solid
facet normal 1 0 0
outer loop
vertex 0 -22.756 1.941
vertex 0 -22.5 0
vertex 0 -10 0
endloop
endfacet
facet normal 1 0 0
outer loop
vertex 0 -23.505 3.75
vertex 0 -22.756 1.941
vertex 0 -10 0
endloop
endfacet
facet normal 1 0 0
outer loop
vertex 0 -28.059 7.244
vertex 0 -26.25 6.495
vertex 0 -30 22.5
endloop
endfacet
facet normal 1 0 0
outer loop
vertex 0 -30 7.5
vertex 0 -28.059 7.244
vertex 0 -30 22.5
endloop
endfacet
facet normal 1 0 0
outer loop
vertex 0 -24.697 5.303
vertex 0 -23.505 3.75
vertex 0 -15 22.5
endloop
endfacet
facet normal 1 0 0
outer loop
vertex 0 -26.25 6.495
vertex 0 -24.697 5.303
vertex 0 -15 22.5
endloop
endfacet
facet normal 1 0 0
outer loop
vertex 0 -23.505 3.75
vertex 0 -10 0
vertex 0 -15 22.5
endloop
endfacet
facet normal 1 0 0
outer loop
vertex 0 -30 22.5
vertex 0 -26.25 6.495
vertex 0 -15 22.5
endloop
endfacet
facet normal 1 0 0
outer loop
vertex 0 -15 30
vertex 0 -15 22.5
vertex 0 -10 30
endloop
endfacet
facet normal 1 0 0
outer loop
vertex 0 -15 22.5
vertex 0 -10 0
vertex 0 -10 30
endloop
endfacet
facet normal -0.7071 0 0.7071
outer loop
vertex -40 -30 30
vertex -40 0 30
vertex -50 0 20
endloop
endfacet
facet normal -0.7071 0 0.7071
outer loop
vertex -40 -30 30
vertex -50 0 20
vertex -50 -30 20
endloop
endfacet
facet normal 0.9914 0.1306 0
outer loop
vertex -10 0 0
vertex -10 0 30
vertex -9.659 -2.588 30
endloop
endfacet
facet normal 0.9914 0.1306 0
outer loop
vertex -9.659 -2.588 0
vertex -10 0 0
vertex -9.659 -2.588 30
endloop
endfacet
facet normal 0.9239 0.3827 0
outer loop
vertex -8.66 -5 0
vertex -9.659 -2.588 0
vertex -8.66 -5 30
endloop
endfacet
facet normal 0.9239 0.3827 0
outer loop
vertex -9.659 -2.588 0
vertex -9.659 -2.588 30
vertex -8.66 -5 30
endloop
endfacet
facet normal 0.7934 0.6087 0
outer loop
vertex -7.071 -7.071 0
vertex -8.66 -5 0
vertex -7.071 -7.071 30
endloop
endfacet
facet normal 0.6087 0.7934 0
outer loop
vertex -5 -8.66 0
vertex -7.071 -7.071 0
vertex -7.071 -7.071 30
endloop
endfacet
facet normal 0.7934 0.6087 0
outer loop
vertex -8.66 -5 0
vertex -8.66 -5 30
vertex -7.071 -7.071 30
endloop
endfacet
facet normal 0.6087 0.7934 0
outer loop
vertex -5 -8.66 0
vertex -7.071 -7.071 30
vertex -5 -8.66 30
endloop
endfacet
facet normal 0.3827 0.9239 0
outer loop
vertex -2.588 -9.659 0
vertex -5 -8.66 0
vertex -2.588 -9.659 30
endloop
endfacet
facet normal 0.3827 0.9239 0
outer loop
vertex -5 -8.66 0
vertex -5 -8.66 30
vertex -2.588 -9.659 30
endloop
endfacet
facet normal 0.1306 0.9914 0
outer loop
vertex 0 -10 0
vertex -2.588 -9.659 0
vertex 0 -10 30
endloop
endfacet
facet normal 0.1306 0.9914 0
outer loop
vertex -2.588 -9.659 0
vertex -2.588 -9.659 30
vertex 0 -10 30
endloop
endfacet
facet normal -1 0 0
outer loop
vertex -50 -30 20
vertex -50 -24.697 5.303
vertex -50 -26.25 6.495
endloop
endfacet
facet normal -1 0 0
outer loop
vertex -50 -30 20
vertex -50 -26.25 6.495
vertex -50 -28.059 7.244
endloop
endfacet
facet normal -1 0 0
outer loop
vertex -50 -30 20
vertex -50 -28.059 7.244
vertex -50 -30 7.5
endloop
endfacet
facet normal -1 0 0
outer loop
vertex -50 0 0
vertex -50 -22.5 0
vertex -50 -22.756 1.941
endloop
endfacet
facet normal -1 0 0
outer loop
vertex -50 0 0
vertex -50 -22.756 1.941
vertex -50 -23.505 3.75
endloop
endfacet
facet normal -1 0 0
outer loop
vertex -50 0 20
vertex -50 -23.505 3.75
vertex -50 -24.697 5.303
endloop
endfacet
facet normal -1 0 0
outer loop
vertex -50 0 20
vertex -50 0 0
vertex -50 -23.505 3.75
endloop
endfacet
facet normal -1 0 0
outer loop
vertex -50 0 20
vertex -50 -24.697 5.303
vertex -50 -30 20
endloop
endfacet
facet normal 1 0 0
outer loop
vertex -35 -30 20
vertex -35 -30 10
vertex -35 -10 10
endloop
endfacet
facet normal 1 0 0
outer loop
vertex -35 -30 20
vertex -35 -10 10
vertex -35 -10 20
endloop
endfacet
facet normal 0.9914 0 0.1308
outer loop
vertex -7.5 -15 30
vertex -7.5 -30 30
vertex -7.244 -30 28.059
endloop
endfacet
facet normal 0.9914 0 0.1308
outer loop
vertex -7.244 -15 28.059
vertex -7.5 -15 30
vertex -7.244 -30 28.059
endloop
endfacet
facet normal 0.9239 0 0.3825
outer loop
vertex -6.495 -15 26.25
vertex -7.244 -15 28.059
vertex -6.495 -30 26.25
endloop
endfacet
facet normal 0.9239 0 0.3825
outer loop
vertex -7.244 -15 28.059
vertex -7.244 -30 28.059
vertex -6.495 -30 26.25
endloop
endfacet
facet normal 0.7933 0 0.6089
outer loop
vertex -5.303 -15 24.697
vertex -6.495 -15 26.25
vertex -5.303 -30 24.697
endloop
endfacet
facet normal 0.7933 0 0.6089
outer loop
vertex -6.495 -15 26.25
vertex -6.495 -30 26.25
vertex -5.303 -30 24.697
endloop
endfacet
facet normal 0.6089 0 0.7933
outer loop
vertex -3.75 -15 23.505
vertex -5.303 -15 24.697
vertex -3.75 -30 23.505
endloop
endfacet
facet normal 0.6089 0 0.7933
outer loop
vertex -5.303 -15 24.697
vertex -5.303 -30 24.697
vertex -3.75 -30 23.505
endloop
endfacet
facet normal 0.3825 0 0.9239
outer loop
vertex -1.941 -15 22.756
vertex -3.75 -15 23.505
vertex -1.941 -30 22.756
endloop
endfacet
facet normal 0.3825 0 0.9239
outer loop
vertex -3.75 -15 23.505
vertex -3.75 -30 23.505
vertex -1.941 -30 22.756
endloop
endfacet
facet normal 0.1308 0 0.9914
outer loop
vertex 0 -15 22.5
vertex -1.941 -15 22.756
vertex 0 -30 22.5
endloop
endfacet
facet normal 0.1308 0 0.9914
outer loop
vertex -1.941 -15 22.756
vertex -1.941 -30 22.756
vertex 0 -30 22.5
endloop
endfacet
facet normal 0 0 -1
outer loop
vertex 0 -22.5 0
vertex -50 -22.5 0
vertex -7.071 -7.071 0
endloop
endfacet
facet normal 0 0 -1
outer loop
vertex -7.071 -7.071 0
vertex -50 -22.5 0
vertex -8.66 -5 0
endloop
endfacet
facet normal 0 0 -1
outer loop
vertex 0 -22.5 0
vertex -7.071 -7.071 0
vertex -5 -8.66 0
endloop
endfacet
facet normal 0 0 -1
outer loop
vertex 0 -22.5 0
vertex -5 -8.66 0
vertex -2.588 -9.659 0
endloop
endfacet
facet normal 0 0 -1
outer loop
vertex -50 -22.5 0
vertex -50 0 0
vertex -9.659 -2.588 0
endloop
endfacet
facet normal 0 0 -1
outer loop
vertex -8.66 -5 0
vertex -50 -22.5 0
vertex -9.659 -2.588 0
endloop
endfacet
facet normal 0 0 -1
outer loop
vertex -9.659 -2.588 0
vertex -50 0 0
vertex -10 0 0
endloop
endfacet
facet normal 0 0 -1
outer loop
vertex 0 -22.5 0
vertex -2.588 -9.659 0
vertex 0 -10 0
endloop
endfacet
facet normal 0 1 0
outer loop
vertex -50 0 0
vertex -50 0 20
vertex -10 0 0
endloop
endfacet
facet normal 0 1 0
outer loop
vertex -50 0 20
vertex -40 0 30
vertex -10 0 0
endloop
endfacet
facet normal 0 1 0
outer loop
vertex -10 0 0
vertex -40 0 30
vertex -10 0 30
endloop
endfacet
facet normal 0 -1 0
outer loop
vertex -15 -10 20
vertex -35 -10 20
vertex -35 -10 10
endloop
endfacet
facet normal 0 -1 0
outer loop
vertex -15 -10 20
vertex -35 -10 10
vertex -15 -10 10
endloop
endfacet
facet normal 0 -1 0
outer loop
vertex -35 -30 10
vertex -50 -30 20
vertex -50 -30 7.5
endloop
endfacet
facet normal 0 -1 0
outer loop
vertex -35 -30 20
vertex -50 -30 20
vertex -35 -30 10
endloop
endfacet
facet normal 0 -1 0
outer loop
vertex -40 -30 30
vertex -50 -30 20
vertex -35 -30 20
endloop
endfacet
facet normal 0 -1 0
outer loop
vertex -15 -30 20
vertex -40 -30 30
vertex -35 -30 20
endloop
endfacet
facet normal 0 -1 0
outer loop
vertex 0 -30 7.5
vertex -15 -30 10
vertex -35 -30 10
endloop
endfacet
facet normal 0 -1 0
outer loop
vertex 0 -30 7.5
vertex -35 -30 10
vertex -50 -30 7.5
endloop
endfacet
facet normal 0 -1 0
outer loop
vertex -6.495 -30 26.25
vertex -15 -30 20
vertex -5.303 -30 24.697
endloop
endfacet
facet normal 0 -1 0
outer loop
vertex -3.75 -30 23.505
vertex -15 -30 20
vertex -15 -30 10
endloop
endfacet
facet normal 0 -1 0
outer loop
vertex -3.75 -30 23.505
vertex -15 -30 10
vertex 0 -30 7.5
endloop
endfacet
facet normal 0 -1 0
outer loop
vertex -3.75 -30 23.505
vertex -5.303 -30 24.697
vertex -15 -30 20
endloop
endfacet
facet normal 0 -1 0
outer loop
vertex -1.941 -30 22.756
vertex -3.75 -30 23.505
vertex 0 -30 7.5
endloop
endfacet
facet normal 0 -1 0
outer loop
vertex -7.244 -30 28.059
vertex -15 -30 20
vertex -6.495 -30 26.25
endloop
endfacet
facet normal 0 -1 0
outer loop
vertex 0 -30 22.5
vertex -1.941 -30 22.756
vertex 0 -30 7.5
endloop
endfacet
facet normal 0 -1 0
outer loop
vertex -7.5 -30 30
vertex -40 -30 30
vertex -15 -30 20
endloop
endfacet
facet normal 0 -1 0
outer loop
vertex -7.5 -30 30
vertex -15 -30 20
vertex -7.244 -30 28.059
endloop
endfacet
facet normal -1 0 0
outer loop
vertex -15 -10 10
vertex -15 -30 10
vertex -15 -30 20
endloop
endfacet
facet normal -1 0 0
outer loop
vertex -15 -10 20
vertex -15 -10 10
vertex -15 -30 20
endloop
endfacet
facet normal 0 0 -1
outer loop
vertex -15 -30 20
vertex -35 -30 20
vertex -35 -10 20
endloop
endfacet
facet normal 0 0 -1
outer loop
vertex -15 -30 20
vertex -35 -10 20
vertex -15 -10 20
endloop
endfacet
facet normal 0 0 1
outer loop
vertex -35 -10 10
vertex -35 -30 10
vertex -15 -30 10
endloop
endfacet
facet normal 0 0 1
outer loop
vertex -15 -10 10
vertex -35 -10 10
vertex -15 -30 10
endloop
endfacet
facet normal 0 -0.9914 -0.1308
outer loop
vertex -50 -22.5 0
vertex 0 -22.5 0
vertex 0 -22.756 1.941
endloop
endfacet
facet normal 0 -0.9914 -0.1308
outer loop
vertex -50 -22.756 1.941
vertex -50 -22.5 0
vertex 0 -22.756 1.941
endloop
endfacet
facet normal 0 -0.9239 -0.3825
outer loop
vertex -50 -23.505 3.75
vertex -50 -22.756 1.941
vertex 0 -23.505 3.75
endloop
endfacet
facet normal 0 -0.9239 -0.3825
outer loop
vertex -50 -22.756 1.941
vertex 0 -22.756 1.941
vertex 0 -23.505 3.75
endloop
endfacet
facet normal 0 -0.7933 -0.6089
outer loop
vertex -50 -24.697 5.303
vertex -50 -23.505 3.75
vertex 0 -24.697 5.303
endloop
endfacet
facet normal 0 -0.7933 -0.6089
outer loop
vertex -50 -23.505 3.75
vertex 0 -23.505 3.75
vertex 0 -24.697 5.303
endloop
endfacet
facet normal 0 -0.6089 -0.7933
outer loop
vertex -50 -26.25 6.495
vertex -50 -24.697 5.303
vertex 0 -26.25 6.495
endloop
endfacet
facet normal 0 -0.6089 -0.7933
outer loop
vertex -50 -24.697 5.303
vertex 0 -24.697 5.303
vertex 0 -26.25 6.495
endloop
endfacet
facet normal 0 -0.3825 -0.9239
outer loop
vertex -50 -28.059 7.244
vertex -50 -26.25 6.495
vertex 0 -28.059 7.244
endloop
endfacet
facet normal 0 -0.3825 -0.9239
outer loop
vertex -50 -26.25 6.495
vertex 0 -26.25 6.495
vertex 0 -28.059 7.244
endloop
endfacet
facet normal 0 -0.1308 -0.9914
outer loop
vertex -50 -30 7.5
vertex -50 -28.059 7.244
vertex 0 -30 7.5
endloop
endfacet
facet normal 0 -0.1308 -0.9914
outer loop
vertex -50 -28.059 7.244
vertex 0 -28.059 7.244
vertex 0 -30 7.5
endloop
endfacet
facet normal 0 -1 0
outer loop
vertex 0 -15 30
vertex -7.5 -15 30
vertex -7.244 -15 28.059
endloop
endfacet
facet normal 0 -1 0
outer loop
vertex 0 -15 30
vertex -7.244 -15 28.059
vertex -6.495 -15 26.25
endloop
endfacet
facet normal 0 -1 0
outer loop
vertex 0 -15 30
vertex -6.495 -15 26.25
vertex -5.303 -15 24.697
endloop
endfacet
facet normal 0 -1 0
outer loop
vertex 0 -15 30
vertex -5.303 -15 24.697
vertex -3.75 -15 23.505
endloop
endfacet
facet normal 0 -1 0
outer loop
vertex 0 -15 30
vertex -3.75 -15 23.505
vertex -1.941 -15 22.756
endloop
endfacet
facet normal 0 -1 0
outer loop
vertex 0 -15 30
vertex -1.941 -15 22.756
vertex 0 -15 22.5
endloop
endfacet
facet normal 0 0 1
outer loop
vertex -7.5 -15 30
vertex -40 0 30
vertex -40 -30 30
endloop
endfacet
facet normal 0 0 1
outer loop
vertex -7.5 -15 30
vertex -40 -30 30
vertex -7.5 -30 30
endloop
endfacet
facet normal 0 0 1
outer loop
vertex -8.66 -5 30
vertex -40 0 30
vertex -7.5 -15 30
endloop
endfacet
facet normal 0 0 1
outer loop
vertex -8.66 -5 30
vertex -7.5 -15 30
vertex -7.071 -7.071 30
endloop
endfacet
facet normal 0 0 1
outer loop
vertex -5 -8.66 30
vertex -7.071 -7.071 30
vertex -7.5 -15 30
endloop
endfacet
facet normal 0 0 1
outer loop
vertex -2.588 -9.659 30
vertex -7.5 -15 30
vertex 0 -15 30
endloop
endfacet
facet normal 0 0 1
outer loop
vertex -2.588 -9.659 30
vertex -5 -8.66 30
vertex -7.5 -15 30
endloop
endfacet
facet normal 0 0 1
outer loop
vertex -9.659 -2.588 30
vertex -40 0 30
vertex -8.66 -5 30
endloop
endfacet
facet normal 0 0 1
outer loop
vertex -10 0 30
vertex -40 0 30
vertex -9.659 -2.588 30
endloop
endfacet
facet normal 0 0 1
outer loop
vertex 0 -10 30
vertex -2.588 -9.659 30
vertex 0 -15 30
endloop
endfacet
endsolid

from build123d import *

# Parameters (mm, degrees)
F0_W     = 50
F0_H     = 30
F1_DEPTH = 30
F3_DEPTH = 50
F5_DEPTH = 30
F7_DEPTH = 15
F6_W     = 20
F6_H     = 10
F8_DEPTH = 20
F9_SIZE  = 10


with BuildPart() as f1:
    # F0 (on Front) → F1 (new body)
    with BuildSketch(Plane.XZ):
        with Locations((-25, 15)):
            Rectangle(F0_W, F0_H)
    extrude(amount=F1_DEPTH)

    # F2 (on face) → F3 (cut, through all)
    with BuildSketch(Plane.YZ):
        with BuildLine():
            Line((-30, 0), (-22.5, 0))
            ThreePointArc((-22.5, 0), (-24.6966991411, 5.3033008589), (-30, 7.5))
            Line((-30, 7.5), (-30, 0))
        make_face()
    extrude(amount=-F3_DEPTH, mode=Mode.SUBTRACT)

    # F4 (on face) → F5 (cut, through all)
    with BuildSketch(Plane.XY.offset(30)):
        with BuildLine():
            Line((0, 0), (-10, 0))
            ThreePointArc((-10, 0), (-7.0710678119, -7.0710678119), (0, -10))
            Line((0, -10), (0, 0))
        make_face()
    extrude(amount=-F5_DEPTH, mode=Mode.SUBTRACT)

    # F6 (on face) → F7 (cut)
    with BuildSketch(Plane.XZ.offset(30)):
        with BuildLine():
            Line((0, 30), (-7.5, 30))
            ThreePointArc((-7.5, 30), (-5.3033008589, 24.6966991411), (0, 22.5))
            Line((0, 22.5), (0, 30))
        make_face()
    extrude(amount=-F7_DEPTH, mode=Mode.SUBTRACT)

    # F6 (on face) → F8 (cut)
    with BuildSketch(Plane.XZ.offset(30)):
        with Locations((-25, 15)):
            Rectangle(F6_W, F6_H)
    extrude(amount=-F8_DEPTH, mode=Mode.SUBTRACT)

    # F9
    f9_edges = [f1.edges().sort_by_distance(p)[0] for p in [
        (-50, -15, 30),
    ]]
    chamfer(f9_edges, length=F9_SIZE)


solid = f1.part
